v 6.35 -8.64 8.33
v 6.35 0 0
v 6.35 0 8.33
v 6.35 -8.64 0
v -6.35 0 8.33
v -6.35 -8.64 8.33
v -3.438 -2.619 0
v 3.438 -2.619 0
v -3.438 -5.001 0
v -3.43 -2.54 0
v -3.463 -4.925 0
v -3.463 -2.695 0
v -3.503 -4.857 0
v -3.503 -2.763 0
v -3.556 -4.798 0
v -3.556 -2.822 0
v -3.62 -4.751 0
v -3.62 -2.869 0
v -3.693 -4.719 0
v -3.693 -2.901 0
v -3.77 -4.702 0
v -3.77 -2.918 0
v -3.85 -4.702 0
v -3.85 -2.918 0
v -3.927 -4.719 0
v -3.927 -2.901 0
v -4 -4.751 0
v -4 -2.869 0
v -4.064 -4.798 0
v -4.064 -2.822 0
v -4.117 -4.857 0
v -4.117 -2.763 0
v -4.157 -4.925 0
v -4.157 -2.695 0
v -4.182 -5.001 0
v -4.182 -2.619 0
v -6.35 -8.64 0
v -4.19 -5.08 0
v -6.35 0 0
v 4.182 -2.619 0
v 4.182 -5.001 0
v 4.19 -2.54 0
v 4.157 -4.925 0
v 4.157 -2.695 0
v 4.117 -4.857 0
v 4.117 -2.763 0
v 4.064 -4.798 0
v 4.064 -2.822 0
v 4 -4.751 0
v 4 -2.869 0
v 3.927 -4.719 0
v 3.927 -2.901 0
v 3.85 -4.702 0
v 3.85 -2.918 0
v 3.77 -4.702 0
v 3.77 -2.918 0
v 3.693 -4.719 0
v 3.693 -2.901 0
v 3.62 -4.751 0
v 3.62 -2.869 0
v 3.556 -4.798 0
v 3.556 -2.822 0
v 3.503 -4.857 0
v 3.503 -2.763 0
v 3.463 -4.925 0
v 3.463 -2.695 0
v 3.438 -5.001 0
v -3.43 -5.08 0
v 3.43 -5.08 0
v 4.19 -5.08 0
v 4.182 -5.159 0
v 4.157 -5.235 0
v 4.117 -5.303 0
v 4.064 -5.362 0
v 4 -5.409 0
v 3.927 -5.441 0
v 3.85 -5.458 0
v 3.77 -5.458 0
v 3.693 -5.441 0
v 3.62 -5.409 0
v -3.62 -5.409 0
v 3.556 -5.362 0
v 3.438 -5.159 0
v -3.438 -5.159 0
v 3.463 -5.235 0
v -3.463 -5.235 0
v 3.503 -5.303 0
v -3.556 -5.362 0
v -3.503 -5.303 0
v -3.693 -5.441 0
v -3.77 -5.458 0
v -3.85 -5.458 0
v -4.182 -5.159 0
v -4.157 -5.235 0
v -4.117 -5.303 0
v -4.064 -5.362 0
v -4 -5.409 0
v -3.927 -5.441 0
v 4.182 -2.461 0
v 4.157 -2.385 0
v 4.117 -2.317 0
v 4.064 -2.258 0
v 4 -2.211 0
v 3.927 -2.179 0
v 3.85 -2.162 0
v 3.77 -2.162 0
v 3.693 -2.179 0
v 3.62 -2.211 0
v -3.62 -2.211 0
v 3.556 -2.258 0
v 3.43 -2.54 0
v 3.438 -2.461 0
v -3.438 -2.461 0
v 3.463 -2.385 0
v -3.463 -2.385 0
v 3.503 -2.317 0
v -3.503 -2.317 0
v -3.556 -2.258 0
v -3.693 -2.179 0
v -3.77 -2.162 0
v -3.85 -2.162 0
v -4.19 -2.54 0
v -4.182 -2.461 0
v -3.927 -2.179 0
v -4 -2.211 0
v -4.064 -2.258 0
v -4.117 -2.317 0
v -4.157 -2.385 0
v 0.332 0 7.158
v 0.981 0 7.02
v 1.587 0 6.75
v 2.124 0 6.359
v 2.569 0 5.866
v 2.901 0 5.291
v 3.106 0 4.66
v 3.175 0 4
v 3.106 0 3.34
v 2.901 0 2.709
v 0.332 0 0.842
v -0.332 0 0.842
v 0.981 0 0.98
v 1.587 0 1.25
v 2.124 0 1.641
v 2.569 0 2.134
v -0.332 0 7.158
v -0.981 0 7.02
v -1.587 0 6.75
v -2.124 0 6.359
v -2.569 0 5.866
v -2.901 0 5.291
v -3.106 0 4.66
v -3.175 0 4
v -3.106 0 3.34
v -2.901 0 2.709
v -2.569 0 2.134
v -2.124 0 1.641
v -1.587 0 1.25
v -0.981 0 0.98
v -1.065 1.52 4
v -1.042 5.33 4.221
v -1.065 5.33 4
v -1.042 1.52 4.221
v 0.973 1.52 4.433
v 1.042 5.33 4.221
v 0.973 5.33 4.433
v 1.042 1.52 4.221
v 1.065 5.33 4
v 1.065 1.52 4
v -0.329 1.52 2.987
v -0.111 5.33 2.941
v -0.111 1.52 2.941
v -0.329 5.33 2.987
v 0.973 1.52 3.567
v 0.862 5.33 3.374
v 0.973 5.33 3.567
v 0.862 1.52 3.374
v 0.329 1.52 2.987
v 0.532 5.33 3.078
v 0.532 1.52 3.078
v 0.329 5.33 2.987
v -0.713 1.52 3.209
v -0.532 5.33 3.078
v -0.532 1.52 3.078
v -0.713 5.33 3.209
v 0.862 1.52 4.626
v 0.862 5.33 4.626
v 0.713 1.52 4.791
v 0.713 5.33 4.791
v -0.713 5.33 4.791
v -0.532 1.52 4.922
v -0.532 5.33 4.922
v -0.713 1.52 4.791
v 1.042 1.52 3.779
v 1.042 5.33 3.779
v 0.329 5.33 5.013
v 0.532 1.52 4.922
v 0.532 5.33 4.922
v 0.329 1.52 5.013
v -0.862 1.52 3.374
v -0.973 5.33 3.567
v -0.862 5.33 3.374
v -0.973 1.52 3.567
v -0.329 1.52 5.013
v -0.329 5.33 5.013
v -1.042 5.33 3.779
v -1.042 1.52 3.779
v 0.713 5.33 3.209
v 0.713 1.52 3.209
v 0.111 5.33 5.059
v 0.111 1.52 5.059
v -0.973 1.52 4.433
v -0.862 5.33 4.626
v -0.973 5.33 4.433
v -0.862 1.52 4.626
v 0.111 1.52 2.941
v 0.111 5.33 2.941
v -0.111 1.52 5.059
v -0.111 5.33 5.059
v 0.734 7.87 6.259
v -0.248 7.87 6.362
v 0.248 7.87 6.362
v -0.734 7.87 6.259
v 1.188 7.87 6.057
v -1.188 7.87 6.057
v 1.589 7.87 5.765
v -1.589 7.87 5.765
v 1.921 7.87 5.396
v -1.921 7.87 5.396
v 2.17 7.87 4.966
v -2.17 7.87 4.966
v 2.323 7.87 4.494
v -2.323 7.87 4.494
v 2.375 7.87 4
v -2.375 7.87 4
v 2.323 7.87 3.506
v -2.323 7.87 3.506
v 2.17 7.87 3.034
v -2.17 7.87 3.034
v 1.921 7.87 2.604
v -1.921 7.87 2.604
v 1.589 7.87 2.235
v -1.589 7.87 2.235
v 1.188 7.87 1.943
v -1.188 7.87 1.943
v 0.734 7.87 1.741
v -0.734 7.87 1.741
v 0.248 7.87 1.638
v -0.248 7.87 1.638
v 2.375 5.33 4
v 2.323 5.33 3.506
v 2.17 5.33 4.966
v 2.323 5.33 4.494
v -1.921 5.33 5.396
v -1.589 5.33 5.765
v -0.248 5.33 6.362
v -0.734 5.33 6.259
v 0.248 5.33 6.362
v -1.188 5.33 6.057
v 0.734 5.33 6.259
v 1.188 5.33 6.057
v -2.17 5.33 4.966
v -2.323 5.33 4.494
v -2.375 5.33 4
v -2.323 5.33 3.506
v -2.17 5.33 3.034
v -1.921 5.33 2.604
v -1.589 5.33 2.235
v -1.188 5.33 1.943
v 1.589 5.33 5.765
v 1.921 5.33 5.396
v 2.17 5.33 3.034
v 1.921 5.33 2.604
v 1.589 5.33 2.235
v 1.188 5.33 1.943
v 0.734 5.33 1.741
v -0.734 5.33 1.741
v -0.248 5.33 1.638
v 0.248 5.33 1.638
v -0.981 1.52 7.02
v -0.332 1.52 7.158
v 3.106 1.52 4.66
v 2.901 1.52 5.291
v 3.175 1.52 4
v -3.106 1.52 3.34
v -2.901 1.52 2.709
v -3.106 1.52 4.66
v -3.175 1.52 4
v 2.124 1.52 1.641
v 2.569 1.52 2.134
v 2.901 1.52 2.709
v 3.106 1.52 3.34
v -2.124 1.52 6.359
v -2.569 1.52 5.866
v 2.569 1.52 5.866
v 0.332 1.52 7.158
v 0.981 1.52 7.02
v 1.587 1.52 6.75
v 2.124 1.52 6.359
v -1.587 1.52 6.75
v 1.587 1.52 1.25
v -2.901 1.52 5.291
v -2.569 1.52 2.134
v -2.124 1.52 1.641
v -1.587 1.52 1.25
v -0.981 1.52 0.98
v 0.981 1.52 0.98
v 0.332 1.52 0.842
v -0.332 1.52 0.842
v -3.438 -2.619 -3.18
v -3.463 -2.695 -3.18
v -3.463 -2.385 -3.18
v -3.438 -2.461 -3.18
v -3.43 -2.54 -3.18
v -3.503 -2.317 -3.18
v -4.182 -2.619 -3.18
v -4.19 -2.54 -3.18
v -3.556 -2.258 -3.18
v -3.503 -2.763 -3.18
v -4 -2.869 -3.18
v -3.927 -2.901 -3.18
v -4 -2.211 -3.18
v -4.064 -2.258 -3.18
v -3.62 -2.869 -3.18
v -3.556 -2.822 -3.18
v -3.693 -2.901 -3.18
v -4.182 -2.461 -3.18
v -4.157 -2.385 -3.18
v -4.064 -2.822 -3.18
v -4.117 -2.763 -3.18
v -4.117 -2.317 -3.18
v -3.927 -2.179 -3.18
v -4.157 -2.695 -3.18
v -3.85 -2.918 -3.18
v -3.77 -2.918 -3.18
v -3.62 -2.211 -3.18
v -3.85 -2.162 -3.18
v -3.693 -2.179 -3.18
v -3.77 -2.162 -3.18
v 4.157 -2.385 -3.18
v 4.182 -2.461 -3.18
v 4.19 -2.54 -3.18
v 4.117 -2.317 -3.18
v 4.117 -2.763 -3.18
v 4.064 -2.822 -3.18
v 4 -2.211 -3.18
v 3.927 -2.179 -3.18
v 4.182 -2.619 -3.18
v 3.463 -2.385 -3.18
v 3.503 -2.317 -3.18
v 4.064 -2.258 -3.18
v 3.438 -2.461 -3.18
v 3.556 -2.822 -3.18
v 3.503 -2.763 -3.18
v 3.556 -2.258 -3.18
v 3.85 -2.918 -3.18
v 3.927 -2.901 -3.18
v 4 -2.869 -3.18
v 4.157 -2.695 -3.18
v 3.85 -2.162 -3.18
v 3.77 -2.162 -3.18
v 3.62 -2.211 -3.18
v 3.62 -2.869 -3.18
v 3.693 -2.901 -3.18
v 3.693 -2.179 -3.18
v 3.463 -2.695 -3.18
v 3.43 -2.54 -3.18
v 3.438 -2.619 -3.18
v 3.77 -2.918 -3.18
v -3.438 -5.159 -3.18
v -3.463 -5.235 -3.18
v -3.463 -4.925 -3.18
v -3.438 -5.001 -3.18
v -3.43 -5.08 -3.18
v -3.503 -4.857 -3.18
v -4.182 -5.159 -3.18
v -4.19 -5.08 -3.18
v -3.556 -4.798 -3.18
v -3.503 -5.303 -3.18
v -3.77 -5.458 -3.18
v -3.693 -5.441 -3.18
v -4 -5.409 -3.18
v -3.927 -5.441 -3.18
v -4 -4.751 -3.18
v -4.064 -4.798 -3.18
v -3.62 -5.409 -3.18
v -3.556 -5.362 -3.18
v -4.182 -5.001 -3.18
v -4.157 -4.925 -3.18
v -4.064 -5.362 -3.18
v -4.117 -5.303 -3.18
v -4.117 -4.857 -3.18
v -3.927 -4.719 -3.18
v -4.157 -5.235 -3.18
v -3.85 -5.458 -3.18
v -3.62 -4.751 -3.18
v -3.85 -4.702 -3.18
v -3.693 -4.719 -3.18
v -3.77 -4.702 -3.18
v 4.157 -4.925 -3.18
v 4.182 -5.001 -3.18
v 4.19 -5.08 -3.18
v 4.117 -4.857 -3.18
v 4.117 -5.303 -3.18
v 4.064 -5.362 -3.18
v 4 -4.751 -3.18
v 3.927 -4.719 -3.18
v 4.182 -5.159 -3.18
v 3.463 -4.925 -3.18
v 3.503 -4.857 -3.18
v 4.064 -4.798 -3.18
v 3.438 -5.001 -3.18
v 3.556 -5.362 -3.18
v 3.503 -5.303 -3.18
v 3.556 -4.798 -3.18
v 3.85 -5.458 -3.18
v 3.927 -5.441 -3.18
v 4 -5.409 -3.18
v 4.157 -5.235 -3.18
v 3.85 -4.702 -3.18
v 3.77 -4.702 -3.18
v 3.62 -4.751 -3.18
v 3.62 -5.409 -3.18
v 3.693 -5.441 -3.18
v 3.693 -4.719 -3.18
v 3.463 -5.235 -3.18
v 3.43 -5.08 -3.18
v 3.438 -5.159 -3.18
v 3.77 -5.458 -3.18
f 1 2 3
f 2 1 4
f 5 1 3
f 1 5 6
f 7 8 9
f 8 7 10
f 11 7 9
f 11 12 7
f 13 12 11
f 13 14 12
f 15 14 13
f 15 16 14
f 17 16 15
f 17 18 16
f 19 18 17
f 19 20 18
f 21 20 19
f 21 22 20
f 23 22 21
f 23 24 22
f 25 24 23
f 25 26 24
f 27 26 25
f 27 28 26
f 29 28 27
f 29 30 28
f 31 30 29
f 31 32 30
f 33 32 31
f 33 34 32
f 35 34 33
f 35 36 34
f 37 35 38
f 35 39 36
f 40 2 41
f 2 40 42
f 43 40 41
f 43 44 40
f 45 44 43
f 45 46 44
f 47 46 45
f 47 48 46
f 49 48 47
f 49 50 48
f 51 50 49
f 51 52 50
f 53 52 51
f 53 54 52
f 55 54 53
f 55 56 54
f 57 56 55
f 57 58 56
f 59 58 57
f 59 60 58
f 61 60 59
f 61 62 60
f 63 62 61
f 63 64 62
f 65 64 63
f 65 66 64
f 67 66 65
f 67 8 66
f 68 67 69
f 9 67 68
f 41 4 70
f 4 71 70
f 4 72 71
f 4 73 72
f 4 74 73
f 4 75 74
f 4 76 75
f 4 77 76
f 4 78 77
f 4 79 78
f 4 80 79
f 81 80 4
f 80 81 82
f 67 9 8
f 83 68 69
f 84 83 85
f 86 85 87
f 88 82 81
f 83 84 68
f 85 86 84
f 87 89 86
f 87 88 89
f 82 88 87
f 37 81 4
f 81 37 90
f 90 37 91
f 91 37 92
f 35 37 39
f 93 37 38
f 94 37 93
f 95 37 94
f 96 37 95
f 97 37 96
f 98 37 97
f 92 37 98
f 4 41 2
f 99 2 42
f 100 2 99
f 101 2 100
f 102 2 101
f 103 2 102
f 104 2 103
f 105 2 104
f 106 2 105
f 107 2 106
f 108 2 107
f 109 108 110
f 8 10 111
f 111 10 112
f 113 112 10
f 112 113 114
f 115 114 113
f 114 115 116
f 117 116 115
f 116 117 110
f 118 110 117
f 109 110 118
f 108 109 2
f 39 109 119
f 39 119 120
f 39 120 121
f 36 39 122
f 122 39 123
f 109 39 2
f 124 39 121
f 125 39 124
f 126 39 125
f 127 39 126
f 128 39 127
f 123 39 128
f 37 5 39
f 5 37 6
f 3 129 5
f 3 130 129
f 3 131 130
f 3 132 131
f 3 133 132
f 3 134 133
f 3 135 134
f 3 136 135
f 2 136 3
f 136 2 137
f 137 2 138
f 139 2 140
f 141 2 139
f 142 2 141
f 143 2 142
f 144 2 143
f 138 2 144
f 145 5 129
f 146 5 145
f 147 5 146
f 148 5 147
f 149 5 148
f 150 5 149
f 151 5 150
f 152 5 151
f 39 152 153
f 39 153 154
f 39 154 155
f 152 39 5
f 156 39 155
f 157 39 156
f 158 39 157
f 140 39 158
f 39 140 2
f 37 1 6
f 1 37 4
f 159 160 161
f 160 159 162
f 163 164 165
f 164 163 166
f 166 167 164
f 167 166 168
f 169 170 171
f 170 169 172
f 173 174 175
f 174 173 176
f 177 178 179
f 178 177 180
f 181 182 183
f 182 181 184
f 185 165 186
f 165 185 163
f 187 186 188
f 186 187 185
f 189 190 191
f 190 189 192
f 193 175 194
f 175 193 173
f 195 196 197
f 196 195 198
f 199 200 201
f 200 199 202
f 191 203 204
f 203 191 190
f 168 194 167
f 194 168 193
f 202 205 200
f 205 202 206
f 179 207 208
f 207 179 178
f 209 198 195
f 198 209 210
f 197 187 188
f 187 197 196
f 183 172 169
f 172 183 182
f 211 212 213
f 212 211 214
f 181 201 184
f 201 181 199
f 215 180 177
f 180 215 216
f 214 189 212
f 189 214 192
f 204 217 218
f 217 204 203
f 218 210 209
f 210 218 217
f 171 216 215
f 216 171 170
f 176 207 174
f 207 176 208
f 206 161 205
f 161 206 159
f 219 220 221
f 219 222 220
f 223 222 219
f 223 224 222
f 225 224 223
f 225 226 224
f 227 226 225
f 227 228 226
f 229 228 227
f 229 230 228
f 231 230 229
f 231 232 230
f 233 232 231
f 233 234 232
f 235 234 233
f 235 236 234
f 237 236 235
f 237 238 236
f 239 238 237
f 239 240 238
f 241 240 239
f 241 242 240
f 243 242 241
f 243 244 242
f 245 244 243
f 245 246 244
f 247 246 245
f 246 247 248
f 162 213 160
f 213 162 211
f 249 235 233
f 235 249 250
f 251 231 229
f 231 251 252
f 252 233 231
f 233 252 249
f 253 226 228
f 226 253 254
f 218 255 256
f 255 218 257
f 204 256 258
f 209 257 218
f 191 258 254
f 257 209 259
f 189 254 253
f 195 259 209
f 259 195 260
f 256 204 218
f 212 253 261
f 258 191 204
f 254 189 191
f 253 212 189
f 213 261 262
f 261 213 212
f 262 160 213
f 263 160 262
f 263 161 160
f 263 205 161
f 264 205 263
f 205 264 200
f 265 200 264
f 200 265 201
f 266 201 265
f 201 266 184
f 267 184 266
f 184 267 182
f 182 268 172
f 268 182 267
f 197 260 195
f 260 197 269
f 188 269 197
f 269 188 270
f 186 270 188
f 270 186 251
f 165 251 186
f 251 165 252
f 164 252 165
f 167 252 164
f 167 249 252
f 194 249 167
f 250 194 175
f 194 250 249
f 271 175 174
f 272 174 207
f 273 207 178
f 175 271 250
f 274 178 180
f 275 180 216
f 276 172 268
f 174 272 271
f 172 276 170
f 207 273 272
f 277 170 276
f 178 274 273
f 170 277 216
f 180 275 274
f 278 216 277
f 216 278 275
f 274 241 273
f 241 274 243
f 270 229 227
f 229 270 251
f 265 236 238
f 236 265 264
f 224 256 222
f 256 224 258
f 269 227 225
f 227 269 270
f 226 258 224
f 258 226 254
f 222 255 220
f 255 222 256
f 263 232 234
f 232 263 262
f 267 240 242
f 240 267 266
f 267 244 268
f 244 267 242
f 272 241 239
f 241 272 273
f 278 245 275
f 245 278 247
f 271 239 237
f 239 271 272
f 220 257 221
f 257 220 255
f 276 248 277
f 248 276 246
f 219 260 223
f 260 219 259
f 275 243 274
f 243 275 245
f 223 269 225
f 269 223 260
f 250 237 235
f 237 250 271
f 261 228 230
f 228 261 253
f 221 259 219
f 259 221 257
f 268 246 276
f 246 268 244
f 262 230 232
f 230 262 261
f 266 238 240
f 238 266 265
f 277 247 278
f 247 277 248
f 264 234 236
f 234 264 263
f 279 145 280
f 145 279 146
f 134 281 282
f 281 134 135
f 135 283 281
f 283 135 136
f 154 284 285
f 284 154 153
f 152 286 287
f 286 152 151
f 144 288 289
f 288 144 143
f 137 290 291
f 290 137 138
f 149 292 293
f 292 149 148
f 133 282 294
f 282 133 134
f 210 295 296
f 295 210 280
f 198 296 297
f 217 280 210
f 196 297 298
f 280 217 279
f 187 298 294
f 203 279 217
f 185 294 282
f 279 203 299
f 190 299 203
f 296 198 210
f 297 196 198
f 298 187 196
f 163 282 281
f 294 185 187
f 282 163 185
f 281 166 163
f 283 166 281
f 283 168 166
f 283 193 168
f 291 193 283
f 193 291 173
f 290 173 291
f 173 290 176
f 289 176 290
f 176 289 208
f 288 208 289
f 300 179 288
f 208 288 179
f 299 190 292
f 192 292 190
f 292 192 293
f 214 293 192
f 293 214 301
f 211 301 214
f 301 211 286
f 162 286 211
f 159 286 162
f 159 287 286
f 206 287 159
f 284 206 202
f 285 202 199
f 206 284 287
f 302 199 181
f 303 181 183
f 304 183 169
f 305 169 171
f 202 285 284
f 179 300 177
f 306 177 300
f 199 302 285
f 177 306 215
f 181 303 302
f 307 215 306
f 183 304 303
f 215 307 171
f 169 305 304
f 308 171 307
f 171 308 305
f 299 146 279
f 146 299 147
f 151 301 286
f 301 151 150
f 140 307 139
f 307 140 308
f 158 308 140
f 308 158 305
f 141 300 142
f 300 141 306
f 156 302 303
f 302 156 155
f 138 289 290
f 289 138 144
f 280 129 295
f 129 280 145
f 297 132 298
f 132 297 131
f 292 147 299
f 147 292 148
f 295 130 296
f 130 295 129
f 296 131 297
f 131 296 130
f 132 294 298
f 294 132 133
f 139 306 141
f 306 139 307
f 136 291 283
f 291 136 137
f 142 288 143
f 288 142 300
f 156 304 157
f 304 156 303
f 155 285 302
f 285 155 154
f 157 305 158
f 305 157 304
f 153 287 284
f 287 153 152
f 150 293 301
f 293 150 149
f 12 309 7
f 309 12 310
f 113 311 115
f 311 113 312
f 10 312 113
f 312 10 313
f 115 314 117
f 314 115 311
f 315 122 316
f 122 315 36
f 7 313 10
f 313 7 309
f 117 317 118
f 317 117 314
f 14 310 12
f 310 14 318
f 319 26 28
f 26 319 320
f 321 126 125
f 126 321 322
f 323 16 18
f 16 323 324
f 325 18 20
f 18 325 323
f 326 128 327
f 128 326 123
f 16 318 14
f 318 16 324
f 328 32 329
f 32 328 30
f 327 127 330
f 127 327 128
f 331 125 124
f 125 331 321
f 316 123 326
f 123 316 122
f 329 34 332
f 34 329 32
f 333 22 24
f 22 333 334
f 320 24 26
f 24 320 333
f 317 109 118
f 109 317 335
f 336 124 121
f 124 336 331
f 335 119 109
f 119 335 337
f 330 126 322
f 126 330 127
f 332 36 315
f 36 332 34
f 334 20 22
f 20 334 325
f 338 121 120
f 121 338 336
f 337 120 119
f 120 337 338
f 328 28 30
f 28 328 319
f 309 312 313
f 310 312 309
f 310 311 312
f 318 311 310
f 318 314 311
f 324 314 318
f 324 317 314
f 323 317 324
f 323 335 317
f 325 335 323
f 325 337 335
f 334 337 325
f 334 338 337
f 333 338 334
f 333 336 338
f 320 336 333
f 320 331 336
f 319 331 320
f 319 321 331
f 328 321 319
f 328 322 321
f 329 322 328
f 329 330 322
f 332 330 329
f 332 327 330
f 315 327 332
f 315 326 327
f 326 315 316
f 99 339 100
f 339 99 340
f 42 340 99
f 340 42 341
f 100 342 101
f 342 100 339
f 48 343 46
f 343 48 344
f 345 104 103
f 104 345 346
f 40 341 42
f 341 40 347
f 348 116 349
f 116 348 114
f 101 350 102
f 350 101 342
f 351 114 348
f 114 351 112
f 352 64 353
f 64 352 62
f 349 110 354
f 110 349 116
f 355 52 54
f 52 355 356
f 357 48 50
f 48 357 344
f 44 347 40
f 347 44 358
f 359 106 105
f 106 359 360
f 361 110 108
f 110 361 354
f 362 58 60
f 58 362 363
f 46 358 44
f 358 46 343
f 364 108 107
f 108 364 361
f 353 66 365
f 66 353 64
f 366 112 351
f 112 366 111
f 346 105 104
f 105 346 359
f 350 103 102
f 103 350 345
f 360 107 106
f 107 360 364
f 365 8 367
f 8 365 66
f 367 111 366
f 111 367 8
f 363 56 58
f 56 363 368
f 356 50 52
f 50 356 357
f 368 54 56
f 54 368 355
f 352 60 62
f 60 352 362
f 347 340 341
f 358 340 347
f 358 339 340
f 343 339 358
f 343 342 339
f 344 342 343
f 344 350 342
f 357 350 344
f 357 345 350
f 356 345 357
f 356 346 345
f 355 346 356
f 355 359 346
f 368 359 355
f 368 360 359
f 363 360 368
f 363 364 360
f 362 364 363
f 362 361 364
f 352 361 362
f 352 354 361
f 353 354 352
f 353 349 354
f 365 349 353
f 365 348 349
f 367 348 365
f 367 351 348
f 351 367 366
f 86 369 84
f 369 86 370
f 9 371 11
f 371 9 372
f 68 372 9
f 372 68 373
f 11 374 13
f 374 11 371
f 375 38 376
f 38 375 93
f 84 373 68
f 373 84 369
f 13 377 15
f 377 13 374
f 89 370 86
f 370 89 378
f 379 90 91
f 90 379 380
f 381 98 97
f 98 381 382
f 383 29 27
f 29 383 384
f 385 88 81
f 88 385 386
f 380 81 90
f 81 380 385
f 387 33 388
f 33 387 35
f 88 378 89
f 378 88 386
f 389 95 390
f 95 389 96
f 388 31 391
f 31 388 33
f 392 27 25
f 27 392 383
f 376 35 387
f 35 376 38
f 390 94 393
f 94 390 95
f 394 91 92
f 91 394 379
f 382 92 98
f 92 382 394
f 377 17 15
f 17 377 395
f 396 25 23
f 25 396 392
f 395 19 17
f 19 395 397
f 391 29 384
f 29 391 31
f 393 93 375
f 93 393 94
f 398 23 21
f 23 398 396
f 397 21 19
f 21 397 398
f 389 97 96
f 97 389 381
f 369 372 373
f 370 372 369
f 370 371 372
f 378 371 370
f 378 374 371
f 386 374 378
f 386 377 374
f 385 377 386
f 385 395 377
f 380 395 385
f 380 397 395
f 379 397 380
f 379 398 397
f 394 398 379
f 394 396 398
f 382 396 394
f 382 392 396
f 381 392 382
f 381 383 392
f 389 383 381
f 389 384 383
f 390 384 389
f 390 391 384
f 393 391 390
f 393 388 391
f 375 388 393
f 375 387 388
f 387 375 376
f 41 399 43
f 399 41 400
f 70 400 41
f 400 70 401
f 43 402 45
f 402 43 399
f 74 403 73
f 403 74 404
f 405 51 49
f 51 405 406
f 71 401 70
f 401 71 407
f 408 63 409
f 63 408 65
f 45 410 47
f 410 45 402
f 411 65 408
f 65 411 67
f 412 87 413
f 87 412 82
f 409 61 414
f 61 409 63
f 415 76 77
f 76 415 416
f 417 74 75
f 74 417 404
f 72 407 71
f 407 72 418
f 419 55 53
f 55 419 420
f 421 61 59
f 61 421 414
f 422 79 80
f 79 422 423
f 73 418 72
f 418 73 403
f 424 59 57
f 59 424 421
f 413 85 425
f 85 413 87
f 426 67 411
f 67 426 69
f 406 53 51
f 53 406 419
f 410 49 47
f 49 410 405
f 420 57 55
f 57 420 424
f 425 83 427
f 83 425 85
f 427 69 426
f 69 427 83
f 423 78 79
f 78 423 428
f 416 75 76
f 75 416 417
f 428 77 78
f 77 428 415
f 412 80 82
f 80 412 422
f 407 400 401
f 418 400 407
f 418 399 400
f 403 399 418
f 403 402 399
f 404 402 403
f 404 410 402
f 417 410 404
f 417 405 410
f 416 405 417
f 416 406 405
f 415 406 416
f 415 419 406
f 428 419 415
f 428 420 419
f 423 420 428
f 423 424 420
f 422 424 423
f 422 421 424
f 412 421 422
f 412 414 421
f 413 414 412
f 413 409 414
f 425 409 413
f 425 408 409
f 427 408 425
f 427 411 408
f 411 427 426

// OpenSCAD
$fn=30;

translate([-12.7/2,-8.64,0]) cube([12.7, 8.64, 8.33], center=false);
translate([0,6.35+(10.16-8.64),4]) rotate([90,0,0]) cylinder(d=2.13, h=6.35+(10.16-8.64));
translate([0,6.35+(10.16-8.64),4]) rotate([90,0,0]) cylinder(d=4.75, h=2.54);
translate([0,6.35+(10.16-8.64)-6.35,4]) rotate([90,0,0]) cylinder(d=6.35, h=(10.16-8.64));

translate([-7.62/2,-2.54,0]) cylinder(d=0.76, h=3.18*2, center=true);
translate([7.62/2,-2.54,0]) cylinder(d=0.76, h=3.18*2, center=true);

translate([-7.62/2,-2*2.54,0]) cylinder(d=0.76, h=3.18*2, center=true);
translate([7.62/2,-2*2.54,0]) cylinder(d=0.76, h=3.18*2, center=true);
